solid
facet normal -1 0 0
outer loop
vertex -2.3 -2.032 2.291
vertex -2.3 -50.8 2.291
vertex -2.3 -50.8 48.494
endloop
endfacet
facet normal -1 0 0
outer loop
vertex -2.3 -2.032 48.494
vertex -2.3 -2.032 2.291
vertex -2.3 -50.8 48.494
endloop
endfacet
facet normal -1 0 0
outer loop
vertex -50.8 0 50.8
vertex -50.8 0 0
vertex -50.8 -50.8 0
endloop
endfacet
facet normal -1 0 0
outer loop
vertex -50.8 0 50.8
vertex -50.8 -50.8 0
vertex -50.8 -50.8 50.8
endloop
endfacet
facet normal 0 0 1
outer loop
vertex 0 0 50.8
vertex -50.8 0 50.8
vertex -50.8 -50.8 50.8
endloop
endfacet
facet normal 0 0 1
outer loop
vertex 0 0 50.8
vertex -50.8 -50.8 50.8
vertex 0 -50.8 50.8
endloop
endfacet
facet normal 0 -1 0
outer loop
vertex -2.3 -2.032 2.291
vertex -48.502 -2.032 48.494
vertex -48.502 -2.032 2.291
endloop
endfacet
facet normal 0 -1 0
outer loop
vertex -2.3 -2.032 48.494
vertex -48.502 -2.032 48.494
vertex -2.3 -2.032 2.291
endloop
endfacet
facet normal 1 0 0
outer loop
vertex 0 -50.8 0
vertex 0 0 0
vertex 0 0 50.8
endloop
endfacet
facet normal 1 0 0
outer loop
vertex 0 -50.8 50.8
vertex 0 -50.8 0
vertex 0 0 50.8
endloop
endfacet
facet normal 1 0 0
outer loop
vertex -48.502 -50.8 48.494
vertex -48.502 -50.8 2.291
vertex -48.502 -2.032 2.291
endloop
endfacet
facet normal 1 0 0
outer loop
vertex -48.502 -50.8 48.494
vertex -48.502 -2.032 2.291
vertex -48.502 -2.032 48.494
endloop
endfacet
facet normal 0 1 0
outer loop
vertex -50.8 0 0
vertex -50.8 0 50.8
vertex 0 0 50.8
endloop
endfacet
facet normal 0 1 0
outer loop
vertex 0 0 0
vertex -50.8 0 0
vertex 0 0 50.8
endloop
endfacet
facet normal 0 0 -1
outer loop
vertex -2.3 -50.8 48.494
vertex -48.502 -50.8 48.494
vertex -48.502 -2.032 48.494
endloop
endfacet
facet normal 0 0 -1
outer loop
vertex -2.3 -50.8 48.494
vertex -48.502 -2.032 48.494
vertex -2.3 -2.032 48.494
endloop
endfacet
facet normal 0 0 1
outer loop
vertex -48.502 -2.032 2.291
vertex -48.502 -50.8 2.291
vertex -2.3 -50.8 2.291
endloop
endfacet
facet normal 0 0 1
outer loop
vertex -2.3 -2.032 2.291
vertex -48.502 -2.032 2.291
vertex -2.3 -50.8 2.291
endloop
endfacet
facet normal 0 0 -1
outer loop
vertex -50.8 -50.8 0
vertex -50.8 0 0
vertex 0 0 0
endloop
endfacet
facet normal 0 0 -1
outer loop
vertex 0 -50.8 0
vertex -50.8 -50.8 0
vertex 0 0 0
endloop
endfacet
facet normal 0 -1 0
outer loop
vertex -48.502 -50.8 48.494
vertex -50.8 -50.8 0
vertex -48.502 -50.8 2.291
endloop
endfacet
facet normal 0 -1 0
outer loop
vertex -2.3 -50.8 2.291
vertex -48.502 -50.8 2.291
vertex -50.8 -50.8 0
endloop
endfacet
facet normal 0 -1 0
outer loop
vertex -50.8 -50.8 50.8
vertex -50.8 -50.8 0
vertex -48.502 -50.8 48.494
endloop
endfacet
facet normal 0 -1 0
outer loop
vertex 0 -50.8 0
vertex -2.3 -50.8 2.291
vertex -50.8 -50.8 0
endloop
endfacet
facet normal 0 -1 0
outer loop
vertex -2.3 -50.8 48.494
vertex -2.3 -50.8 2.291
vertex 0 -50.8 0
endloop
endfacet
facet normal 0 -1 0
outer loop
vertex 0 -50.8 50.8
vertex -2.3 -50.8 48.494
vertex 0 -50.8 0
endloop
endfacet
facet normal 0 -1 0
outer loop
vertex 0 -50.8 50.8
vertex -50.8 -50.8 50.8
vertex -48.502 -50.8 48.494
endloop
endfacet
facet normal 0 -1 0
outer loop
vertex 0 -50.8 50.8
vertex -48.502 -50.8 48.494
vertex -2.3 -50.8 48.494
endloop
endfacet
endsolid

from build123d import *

# Parameters (mm, degrees)
F0_W     = 50.8
F0_H     = 50.8
F1_DEPTH = 50.8
F2_W     = 50.8
F2_H     = 50.8
F2_W_2   = 47.1678
F2_H_2   = 46.9646
F3_DEPTH = 49.53
F4_W     = 46.2026
F4_H     = 46.2026
F5_DEPTH = 48.768


with BuildPart() as f1:
    # F0 (on Front) → F1 (new body)
    with BuildSketch(Plane.XZ):
        with Locations((-25.4, 25.4)):
            Rectangle(F0_W, F0_H)
    extrude(amount=F1_DEPTH)

    # F2 (on face) → F3 (join)
    with BuildSketch(Plane.XZ.offset(50.8)):
        with Locations((-25.4, 25.4)):
            Rectangle(F2_W, F2_H)
        with Locations((-25.302492, 25.391847)):
            Rectangle(F2_W_2, F2_H_2, mode=Mode.SUBTRACT)
    extrude(amount=-F3_DEPTH)

    # F4 (on face) → F5 (cut)
    with BuildSketch(Plane.XZ.offset(50.8)):
        with Locations((-25.401182, 25.392756)):
            Rectangle(F4_W, F4_H)
    extrude(amount=-F5_DEPTH, mode=Mode.SUBTRACT)


solid = f1.part
